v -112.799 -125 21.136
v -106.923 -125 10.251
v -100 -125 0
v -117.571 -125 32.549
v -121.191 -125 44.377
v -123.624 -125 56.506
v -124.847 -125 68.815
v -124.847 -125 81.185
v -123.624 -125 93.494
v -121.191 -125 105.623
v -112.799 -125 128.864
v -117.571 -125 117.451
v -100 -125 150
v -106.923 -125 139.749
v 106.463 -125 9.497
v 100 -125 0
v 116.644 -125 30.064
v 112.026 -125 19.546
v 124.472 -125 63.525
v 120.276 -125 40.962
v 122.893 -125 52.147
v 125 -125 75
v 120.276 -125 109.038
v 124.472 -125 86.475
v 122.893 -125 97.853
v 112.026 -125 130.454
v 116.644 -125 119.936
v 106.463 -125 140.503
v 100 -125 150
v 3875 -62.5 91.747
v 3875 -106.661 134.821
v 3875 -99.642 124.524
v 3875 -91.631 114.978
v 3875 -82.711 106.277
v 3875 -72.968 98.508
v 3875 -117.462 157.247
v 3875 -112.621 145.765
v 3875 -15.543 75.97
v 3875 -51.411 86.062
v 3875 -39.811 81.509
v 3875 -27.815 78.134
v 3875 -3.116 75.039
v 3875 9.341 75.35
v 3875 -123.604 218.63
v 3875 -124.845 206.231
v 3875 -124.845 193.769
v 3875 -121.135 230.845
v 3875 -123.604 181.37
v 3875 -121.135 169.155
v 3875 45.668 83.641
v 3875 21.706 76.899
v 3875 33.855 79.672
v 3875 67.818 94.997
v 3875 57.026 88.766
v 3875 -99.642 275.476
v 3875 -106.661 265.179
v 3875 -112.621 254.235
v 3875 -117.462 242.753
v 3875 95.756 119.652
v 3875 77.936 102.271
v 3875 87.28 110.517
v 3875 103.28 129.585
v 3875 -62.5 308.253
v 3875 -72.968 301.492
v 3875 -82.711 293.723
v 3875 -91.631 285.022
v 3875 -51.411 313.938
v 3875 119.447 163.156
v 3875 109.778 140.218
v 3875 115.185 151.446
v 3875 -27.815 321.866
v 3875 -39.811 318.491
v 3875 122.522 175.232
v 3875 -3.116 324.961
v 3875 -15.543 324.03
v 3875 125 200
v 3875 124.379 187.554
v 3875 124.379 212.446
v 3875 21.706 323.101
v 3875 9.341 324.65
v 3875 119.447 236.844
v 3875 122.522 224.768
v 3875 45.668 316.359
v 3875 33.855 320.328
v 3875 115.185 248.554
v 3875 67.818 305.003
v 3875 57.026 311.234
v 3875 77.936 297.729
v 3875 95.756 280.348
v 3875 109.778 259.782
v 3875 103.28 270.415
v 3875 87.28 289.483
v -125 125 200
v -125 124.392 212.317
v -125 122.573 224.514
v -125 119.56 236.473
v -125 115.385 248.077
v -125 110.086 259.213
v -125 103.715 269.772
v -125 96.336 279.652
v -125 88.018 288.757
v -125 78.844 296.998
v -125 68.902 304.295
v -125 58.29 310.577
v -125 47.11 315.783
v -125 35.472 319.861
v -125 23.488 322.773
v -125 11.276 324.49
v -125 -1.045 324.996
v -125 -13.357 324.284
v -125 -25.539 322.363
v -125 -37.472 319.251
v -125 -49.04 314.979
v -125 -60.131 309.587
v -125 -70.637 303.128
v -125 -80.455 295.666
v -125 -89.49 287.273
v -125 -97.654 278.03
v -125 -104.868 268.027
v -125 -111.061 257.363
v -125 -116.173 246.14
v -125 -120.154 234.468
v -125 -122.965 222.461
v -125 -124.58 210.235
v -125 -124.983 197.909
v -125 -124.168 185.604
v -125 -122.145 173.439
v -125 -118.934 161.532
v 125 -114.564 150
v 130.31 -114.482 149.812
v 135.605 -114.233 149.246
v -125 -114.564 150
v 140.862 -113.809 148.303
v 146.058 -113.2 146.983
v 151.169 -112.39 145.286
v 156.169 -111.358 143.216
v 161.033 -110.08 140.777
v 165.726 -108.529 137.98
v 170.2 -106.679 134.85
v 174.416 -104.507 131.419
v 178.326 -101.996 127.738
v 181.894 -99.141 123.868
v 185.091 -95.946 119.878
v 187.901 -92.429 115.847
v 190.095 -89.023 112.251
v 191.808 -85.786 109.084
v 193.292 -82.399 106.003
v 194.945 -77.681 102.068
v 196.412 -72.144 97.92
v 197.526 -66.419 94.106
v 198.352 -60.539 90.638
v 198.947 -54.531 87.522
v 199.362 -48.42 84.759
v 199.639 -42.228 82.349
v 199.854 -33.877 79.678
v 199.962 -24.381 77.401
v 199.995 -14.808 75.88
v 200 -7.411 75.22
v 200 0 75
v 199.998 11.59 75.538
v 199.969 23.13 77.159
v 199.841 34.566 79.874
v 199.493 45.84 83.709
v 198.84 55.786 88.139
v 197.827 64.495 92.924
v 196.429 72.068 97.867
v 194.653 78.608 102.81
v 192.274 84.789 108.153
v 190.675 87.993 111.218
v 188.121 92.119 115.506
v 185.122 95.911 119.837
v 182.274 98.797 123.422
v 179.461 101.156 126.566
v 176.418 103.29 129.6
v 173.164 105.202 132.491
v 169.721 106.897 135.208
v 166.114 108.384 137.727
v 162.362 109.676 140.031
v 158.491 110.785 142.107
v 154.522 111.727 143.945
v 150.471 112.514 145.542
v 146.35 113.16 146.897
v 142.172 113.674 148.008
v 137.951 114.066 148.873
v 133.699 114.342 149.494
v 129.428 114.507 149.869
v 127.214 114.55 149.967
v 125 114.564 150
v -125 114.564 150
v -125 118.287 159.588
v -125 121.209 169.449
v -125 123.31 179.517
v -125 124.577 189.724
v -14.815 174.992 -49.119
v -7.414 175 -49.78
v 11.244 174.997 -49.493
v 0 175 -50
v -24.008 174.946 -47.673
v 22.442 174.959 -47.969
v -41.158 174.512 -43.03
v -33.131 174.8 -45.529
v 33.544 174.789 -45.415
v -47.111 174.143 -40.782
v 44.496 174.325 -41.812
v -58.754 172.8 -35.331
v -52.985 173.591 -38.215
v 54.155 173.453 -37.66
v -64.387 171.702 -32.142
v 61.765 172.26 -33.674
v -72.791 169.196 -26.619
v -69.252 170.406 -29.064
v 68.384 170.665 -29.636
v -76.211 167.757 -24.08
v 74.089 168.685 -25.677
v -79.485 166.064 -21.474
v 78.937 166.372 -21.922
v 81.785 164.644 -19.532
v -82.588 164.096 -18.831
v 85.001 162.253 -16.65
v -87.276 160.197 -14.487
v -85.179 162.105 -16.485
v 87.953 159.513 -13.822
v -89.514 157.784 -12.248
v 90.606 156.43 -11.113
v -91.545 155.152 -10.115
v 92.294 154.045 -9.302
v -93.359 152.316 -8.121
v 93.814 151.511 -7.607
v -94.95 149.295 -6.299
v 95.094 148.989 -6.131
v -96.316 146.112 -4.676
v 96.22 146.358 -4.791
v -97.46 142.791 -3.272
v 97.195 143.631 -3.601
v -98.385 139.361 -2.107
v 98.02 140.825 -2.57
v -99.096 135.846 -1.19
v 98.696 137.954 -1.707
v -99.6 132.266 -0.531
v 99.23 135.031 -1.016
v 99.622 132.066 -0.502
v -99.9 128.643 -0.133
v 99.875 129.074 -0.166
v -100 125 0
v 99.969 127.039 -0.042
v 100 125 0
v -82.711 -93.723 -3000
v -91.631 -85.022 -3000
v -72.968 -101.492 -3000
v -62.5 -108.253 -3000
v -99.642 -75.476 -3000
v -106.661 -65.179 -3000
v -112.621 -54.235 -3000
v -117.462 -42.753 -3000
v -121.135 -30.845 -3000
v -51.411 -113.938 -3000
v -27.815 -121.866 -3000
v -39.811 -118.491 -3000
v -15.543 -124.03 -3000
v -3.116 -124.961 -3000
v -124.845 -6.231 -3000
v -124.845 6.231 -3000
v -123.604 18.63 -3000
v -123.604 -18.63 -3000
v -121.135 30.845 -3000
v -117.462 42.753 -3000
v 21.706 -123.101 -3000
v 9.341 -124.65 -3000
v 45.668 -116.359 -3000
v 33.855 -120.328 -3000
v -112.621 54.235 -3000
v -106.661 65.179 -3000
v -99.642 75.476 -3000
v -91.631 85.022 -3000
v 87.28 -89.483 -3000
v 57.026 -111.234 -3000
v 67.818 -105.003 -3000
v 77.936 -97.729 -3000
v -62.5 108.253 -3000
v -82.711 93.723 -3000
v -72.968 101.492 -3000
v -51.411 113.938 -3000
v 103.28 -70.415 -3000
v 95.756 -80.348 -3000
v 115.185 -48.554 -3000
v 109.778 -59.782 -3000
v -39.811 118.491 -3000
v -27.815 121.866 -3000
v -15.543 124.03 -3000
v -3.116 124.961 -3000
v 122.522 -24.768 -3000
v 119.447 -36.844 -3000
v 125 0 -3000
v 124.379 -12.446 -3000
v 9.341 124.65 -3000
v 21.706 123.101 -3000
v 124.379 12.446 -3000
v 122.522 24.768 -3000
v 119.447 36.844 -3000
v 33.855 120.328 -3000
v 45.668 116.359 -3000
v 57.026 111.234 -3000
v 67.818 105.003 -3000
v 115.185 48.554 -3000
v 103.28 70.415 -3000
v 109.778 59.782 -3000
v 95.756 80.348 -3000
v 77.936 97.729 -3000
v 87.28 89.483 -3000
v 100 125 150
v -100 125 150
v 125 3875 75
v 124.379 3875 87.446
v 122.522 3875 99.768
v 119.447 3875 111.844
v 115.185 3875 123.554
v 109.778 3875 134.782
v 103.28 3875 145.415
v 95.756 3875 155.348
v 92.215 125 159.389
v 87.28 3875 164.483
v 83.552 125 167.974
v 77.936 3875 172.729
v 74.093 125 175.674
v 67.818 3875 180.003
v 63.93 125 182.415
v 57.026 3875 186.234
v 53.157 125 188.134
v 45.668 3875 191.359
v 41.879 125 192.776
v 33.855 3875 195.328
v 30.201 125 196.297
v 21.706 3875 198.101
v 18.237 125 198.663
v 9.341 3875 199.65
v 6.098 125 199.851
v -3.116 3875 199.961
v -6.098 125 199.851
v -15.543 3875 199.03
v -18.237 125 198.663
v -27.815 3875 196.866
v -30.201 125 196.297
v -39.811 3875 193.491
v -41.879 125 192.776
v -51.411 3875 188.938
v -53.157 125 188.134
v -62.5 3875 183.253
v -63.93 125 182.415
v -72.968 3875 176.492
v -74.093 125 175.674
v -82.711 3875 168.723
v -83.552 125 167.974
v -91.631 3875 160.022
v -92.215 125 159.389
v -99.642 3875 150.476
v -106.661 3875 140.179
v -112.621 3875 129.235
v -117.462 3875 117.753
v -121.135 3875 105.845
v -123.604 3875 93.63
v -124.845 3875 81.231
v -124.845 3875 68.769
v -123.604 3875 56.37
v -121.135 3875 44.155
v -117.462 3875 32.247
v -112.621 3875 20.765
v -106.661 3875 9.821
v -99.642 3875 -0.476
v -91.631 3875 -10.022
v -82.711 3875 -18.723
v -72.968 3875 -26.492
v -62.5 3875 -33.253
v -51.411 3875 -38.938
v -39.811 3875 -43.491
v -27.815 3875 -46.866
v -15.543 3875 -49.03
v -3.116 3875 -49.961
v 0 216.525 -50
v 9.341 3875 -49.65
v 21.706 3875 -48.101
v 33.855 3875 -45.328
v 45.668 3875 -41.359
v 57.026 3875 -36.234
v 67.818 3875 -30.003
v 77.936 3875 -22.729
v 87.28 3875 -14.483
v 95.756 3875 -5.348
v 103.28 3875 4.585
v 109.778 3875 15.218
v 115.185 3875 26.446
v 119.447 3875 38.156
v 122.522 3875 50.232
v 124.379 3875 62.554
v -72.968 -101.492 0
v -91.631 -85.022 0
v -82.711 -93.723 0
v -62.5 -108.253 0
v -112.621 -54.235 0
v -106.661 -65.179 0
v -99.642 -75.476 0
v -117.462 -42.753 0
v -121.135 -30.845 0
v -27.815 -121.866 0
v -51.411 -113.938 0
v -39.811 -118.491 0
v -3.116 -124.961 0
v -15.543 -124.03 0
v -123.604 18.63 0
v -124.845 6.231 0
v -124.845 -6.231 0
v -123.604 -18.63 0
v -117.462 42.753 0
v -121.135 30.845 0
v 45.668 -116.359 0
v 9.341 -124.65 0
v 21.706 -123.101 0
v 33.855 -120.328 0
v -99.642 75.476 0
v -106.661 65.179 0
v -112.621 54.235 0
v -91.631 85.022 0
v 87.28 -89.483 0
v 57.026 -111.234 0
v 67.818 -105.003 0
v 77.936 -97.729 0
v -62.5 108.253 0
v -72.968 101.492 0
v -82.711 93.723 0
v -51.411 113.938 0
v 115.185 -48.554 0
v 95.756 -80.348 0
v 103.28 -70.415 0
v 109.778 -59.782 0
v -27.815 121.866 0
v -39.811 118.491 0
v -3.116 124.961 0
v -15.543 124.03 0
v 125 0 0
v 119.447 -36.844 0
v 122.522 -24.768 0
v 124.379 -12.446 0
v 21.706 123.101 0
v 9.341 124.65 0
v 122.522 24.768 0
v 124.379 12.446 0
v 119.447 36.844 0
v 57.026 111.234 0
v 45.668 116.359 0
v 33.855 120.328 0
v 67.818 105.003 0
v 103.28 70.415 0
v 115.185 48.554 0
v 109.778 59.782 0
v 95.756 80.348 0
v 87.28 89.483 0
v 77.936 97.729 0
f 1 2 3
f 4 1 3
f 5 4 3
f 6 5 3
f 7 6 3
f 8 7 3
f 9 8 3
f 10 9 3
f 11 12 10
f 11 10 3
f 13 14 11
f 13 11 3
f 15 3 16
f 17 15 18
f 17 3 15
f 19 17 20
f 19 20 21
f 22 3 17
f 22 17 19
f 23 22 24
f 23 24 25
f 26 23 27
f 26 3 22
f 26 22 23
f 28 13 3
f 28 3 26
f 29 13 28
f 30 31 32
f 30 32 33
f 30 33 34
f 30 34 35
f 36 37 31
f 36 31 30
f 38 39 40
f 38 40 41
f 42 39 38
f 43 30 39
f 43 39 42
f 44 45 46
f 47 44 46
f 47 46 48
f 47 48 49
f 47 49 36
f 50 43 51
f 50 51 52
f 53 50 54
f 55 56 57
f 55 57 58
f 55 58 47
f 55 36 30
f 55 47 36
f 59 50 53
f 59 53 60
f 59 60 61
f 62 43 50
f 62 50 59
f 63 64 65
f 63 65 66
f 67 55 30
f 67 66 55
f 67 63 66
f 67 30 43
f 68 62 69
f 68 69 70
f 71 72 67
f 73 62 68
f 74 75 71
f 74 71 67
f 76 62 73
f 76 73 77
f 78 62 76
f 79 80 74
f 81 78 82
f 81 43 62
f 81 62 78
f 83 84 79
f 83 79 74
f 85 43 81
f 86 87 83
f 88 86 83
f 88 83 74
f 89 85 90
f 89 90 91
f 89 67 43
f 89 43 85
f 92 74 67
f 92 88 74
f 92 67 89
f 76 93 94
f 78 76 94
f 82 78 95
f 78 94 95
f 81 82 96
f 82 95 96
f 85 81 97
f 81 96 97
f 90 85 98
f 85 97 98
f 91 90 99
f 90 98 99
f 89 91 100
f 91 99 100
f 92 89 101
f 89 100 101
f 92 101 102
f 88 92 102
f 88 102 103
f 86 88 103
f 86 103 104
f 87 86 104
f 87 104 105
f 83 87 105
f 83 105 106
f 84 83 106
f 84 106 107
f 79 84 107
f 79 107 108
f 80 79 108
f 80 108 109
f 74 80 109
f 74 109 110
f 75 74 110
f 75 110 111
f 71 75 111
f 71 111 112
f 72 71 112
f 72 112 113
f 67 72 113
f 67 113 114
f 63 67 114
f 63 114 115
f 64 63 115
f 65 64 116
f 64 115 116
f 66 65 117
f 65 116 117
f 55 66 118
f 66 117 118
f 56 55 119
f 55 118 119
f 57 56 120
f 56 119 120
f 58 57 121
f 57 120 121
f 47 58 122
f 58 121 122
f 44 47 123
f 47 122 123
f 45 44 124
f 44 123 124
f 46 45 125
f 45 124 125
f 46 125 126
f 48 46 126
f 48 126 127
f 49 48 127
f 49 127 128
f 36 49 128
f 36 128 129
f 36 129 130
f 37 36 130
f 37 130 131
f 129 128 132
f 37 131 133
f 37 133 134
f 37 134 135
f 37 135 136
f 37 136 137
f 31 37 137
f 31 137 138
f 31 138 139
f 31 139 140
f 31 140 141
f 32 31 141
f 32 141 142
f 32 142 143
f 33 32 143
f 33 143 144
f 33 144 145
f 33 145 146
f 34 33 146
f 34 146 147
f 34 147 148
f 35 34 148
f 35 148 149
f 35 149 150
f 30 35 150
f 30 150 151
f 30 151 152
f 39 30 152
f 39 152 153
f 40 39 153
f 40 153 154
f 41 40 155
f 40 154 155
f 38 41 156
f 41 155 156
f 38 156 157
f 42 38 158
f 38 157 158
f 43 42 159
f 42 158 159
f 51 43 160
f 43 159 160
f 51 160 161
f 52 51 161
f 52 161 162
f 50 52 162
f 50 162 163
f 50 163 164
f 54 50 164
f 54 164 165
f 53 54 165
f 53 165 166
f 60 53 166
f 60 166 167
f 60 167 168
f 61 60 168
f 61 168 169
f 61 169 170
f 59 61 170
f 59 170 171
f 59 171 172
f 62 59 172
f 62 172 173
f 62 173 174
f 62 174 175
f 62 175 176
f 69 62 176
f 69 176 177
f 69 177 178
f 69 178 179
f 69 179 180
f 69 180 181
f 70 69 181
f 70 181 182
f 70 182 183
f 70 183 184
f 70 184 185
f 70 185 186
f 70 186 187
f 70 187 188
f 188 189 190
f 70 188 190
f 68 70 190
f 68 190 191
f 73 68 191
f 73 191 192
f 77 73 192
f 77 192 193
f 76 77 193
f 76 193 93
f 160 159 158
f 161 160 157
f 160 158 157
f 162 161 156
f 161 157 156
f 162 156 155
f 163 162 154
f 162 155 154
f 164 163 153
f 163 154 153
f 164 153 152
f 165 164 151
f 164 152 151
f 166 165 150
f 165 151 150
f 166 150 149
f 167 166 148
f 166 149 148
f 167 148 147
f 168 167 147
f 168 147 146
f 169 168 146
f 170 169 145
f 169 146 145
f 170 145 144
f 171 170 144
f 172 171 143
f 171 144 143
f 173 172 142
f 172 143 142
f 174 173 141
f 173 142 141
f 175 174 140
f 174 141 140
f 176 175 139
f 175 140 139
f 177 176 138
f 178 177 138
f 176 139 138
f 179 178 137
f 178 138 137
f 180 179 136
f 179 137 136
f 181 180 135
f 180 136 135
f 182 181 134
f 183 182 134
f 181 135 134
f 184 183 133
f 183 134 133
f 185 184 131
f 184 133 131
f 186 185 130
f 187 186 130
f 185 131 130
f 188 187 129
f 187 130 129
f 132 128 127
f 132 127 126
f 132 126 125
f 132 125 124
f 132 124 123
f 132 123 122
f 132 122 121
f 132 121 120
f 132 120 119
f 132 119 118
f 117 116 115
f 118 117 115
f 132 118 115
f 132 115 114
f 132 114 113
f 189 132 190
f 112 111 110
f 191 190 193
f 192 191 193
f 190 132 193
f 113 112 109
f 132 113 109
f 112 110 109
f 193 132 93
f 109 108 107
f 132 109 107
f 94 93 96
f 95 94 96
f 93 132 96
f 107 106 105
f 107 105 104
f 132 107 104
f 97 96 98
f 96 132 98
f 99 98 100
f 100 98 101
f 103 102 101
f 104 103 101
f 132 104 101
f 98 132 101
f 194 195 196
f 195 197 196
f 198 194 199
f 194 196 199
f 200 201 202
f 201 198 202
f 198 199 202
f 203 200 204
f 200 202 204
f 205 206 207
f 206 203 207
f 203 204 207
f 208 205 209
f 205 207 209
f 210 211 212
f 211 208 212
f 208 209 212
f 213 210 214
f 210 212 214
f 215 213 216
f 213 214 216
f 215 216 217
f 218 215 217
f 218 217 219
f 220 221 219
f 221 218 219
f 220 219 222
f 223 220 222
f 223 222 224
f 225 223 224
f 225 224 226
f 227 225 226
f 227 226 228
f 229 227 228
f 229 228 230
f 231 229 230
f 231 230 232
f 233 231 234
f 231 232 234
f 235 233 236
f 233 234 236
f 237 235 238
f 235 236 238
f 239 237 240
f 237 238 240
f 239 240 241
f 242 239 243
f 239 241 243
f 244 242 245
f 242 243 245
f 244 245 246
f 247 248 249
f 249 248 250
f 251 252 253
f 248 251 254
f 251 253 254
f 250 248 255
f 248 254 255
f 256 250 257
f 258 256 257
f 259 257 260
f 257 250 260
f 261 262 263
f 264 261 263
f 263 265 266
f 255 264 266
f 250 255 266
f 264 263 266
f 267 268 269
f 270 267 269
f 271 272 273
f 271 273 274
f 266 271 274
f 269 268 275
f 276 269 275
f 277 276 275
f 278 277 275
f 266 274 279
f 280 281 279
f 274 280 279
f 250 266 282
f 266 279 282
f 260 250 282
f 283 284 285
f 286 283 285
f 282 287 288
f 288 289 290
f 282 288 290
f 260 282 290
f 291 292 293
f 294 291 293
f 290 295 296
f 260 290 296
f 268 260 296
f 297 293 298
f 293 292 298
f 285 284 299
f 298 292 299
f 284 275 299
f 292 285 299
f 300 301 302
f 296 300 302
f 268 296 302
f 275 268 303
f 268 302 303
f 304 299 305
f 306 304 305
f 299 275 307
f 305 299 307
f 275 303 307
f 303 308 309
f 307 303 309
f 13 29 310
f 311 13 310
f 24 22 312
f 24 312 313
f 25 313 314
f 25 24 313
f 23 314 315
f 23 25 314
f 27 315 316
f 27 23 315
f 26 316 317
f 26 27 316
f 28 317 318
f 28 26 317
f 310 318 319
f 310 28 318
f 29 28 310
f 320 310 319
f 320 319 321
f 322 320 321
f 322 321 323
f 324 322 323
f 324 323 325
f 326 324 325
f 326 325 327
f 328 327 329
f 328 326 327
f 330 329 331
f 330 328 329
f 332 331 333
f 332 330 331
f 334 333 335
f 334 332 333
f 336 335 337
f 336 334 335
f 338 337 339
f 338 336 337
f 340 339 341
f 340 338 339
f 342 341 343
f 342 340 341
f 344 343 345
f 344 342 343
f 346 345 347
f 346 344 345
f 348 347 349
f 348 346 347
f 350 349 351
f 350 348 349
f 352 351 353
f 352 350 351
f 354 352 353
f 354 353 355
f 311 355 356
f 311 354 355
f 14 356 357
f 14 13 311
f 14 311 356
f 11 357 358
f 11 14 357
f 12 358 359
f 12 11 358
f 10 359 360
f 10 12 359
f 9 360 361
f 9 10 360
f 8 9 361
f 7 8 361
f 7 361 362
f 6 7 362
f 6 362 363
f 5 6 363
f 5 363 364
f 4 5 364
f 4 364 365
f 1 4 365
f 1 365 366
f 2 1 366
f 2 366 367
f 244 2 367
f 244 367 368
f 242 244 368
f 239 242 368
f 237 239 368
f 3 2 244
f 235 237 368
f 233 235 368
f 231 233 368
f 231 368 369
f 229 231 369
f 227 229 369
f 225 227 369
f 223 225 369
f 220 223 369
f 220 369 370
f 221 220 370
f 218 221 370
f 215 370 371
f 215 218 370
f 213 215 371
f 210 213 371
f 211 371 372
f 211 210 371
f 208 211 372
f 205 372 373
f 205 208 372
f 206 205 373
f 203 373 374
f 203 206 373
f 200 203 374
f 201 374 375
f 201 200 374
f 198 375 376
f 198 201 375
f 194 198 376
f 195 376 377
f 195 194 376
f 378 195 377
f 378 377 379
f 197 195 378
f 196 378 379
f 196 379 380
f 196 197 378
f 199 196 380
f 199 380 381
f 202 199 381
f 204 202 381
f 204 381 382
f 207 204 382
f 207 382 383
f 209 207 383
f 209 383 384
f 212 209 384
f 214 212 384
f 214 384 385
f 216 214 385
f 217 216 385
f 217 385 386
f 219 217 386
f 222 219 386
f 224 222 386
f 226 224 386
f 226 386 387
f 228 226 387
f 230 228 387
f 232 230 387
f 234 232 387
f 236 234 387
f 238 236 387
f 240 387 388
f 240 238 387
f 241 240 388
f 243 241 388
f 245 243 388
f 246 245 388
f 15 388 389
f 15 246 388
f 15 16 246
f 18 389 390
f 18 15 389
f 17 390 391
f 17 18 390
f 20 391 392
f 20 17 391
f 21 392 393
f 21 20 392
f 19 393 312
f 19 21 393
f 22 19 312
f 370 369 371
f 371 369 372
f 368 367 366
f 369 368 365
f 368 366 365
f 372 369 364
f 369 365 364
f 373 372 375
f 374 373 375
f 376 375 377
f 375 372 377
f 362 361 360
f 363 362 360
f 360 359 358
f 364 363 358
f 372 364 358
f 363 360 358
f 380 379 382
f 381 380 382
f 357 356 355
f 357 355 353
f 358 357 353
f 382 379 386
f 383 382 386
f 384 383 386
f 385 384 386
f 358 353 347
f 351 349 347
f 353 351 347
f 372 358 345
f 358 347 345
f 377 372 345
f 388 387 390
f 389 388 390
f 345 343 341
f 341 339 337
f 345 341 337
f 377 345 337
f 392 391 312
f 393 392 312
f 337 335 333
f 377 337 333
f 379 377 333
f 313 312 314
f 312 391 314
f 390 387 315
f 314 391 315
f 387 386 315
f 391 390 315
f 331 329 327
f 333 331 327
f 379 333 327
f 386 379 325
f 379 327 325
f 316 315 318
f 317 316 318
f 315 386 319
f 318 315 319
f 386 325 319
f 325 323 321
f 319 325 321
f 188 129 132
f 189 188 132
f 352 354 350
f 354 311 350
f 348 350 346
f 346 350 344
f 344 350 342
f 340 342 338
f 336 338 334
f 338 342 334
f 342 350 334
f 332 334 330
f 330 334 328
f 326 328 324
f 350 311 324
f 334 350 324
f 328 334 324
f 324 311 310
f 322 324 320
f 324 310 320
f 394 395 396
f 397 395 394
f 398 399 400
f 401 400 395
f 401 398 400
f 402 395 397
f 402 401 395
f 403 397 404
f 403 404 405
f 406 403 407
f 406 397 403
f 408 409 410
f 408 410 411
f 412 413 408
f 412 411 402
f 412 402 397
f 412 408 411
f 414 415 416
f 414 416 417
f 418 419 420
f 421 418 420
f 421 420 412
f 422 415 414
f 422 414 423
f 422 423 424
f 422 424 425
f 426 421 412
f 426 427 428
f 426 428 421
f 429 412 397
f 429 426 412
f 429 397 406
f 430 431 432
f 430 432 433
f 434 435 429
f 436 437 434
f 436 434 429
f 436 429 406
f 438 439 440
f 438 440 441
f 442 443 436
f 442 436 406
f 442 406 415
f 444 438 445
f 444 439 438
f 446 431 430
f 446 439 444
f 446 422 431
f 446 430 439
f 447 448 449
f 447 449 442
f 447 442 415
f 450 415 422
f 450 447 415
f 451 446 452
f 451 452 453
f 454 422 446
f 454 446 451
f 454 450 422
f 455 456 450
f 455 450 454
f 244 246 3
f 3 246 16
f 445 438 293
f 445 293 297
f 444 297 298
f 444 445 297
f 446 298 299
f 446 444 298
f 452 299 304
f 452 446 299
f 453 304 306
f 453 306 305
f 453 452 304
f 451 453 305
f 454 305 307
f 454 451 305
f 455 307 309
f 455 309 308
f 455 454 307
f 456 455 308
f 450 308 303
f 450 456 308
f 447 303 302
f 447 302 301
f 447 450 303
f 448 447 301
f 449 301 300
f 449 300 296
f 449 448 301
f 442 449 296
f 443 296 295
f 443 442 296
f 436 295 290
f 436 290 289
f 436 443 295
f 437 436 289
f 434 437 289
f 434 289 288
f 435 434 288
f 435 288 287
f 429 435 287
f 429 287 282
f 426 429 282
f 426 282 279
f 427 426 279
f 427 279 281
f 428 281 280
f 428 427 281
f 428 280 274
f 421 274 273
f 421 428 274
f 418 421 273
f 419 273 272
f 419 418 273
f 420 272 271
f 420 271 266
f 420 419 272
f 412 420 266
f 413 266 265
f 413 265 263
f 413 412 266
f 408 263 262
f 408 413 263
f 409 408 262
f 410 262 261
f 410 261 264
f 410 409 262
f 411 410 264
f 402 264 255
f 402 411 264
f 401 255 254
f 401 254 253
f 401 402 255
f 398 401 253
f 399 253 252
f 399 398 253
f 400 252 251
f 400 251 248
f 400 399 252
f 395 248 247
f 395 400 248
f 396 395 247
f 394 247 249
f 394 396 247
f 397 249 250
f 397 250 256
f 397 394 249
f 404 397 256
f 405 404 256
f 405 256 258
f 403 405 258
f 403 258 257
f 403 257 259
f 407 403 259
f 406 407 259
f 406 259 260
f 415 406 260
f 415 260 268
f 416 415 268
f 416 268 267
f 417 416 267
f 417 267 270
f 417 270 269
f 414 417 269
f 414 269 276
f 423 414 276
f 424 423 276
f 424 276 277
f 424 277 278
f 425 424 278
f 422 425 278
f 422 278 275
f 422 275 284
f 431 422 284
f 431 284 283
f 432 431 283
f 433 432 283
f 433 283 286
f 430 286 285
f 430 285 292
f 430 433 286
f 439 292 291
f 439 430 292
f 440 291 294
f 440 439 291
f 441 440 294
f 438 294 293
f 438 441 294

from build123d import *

# Parameters (mm, degrees)
F0_R      = 125
F1_DEPTH  = 3000
F3_R      = 125
F4_DEPTH  = 4000
F6_DEPTH  = 200
F8_R      = 125
F9_DEPTH  = 4000
F11_DEPTH = 200


with BuildPart() as f1:
    # F0 (on Top) → F1 (new body)
    with BuildSketch(Plane.XY):
        Circle(F0_R)
    extrude(amount=-F1_DEPTH)


with BuildPart() as f4:
    # F3 (on offset) → F4 (new body)
    with BuildSketch(Plane.XZ.offset(125)):
        with Locations((0, 75)):
            Circle(F3_R)
    extrude(amount=-F4_DEPTH)

    # F5 (on Right) → F6 (cut, symmetric)
    with BuildSketch(Plane.YZ):
        with BuildLine():
            ThreePointArc((175, -50), (160.3553390593, -14.6446609407), (125, 0))
            Line((125, 0), (-125, 0))
            Line((-125, 0), (-125, 150))
            Line((-125, 150), (125, 150))
            Line((125, 150), (125, 250))
            Line((125, 250), (-212.5116288662, 250))
            Line((-212.5116288662, 250), (-212.5116288662, -100))
            Line((-212.5116288662, -100), (216.5246456861, -100))
            Line((216.5246456861, -100), (216.5246456861, -50))
            Line((216.5246456861, -50), (175, -50))
        make_face()
    extrude(amount=F6_DEPTH, both=True, mode=Mode.SUBTRACT)


with BuildPart() as f9:
    # F8 (on offset) → F9 (new body)
    with BuildSketch(Plane.YZ.offset(-125)):
        with Locations((0, 200)):
            Circle(F8_R)
    extrude(amount=F9_DEPTH)

    # F10 (on Front) → F11 (cut, symmetric)
    with BuildSketch(Plane.XZ):
        with BuildLine():
            Line((125, 150), (-125, 150))
            Line((-125, 150), (-125, 75))
            Line((-125, 75), (200, 75))
            ThreePointArc((200, 75), (178.033008589, 128.033008589), (125, 150))
        make_face()
    extrude(amount=F11_DEPTH, both=True, mode=Mode.SUBTRACT)


solid = Compound([f1.part, f4.part, f9.part])
